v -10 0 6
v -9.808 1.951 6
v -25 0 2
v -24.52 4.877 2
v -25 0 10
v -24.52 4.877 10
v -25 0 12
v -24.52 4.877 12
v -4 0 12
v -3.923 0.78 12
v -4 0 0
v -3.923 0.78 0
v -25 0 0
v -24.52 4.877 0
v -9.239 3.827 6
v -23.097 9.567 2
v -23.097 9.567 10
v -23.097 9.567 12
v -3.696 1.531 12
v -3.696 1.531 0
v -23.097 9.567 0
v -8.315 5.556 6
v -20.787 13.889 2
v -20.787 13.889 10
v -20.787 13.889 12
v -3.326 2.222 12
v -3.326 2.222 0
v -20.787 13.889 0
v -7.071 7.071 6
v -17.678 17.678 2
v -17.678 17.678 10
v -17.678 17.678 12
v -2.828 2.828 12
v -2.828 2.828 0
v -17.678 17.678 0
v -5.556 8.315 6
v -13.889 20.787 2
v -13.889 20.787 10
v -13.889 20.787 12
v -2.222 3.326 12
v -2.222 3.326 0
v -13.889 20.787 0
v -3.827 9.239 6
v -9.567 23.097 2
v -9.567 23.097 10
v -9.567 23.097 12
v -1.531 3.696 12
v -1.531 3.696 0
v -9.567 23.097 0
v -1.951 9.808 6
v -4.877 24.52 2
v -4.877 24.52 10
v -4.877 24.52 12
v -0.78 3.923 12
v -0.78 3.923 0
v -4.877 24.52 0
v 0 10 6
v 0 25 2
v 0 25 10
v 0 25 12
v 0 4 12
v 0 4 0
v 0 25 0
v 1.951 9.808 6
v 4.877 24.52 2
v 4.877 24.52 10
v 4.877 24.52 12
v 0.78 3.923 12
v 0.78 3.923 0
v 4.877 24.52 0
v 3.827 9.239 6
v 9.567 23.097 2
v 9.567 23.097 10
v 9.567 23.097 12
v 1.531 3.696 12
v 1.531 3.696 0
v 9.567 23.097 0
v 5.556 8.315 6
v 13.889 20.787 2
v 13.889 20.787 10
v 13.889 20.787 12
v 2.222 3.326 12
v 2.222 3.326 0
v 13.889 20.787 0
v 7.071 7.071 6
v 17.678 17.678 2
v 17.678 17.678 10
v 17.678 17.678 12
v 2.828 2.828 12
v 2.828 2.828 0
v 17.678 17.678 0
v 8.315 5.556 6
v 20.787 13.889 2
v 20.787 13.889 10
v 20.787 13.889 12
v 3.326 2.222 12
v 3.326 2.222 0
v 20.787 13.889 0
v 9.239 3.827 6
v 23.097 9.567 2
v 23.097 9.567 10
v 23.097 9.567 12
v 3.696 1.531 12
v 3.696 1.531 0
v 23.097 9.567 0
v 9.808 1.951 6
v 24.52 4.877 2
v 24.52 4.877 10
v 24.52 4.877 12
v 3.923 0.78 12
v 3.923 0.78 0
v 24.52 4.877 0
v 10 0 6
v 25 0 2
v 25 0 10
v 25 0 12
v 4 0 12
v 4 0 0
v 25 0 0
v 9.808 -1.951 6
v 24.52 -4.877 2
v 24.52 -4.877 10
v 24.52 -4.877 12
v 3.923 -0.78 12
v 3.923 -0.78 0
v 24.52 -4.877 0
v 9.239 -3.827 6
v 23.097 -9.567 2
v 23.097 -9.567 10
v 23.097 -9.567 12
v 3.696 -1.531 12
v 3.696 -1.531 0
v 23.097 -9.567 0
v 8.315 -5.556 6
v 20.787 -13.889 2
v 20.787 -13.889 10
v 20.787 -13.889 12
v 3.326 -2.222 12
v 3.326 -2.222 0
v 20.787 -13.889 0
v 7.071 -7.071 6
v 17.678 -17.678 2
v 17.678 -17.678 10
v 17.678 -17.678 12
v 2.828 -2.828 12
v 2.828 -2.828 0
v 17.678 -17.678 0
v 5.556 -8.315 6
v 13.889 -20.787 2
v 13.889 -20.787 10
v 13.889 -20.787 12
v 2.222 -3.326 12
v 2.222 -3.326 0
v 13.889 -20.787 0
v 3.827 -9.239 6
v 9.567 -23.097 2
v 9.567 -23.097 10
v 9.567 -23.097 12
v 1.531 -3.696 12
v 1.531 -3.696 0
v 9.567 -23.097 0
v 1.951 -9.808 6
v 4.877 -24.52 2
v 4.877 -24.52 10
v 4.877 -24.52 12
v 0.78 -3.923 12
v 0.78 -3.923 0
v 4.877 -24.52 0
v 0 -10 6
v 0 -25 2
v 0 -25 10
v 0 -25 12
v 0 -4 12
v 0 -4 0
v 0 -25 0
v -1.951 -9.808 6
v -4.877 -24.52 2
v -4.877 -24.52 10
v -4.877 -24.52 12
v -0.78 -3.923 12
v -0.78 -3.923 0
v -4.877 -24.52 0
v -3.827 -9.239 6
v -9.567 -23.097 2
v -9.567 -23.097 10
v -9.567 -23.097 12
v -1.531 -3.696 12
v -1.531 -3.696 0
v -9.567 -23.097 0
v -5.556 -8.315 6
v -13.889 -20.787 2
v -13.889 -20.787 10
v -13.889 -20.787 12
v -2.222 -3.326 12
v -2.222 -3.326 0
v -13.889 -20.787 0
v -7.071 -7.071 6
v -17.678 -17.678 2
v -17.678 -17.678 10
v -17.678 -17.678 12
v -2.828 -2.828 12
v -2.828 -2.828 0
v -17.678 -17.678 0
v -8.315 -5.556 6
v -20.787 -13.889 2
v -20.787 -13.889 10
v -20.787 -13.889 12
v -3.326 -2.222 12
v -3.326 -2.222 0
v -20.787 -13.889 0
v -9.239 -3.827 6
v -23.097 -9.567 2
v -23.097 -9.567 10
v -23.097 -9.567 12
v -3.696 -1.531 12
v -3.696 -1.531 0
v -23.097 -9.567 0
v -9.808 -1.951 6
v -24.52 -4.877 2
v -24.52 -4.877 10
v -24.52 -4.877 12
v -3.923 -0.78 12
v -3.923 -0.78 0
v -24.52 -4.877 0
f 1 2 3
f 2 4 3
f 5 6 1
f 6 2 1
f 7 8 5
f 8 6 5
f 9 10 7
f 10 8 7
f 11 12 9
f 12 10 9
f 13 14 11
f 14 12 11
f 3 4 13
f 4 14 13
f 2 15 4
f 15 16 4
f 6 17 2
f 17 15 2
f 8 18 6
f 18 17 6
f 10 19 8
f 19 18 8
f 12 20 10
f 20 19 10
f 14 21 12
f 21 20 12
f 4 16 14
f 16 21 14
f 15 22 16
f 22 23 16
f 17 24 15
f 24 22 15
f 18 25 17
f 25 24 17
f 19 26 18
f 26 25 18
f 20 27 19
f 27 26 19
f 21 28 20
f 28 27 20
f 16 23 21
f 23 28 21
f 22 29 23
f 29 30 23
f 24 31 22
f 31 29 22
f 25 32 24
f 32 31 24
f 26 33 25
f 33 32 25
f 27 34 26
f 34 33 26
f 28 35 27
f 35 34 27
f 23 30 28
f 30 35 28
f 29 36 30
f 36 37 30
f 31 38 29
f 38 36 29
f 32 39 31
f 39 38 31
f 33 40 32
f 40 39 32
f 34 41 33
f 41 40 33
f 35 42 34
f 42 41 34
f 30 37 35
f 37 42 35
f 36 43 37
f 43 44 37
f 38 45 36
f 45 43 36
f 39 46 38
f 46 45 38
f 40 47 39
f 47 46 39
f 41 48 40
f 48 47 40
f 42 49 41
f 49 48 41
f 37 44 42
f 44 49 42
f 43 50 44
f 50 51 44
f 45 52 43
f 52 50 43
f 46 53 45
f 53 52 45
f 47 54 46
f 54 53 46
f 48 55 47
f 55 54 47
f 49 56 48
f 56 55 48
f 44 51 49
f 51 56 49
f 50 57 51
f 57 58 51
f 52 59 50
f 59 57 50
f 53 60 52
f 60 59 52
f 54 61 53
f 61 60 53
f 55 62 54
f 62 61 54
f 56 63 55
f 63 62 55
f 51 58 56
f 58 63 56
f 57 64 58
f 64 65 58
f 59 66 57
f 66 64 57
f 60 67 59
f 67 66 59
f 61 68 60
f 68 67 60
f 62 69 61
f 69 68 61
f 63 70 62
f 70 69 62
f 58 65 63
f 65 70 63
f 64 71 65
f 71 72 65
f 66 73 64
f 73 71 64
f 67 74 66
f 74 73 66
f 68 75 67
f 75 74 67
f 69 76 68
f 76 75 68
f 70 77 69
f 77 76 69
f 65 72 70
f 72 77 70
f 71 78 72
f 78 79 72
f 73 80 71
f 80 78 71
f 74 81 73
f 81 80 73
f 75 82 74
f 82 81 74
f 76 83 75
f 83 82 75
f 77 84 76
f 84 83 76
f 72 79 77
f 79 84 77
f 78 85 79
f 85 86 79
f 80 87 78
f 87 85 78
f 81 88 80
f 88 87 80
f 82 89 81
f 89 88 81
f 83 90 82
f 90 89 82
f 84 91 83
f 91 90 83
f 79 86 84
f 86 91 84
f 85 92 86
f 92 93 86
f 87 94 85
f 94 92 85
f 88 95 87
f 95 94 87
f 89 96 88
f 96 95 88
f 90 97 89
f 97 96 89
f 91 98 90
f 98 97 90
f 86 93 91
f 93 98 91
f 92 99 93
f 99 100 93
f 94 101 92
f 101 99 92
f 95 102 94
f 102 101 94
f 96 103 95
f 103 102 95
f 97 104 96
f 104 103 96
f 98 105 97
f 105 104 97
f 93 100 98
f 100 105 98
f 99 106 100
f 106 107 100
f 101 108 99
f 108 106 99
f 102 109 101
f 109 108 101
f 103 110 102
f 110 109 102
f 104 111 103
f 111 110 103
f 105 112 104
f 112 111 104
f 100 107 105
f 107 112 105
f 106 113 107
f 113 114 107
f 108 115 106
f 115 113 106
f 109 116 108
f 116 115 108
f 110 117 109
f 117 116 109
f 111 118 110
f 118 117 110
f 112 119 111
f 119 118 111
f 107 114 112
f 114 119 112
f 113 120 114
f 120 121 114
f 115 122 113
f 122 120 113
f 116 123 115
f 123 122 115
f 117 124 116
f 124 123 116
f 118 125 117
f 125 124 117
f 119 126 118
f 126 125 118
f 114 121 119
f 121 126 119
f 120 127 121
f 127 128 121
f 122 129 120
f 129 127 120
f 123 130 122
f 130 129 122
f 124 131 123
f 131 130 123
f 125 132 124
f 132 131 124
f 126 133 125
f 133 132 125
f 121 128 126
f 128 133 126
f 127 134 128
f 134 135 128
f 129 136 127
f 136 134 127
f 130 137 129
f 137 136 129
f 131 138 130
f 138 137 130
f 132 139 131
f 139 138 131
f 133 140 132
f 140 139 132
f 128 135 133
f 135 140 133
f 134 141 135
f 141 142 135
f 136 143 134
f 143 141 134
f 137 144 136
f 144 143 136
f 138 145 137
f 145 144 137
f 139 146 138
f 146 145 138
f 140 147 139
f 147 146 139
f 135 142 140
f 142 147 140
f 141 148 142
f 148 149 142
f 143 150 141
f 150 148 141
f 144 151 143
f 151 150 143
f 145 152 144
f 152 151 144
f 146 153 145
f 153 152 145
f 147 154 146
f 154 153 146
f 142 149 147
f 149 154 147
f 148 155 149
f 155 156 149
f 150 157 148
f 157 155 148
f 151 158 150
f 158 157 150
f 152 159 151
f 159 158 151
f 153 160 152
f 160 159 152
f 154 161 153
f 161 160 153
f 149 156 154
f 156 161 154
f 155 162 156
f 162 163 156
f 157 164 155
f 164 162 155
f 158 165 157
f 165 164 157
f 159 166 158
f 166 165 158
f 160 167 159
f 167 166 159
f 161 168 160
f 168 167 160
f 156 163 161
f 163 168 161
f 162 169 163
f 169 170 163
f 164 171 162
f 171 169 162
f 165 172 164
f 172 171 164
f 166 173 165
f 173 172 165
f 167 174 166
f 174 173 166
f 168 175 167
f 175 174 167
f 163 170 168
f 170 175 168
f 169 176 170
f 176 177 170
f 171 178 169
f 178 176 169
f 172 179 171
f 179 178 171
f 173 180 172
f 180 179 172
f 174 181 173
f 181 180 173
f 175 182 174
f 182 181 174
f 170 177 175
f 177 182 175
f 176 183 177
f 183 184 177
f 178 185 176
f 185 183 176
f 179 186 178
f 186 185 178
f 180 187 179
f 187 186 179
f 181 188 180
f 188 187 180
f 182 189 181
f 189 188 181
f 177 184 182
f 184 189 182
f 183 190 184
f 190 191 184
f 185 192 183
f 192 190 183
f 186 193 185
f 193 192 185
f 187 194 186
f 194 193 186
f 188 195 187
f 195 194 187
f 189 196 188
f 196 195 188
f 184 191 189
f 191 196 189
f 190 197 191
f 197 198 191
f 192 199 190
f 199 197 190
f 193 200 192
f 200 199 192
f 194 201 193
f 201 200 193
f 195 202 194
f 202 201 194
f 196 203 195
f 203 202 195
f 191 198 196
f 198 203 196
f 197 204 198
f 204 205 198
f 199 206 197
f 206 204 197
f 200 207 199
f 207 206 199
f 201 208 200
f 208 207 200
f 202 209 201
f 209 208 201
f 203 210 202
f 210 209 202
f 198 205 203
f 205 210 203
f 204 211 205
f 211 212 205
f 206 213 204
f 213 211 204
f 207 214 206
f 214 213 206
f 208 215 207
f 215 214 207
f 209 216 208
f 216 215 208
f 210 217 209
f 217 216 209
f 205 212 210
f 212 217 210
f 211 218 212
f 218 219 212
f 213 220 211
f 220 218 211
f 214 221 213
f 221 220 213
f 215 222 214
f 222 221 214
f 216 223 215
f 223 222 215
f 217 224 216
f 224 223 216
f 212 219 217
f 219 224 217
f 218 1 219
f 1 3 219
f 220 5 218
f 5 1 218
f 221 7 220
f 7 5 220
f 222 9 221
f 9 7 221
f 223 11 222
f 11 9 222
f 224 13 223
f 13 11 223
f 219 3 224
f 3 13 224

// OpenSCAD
$fn = 32;

// ----------------------------------------------------------------------
// Revolved part: V-groove pulley R25
// ----------------------------------------------------------------------

// --- parameters (mm) ---
bore_r = 4;               // bore radius
rim_r = 25;               // rim radius
rim_t = 12;               // rim width
groove_r = 10;            // groove root radius
groove_w = 4;             // groove half width
revolve_angle = 360;      // revolve sweep, degrees
fit_tol = 0.1;            // declared fit tolerance (prompt contract)
free_tol = 0.3;           // declared free tolerance (prompt contract)

bore_d = 2 * bore_r;
rim_d = 2 * rim_r;
groove_d = 2 * groove_r;

profile = [[4, 0], [25, 0], [25, 2], [10, 6], [25, 10], [25, 12], [4, 12]];  // primary outline, 7 points, counter clockwise

// --- the one profile operation ---
rotate_extrude(angle = revolve_angle) polygon(points = profile);
